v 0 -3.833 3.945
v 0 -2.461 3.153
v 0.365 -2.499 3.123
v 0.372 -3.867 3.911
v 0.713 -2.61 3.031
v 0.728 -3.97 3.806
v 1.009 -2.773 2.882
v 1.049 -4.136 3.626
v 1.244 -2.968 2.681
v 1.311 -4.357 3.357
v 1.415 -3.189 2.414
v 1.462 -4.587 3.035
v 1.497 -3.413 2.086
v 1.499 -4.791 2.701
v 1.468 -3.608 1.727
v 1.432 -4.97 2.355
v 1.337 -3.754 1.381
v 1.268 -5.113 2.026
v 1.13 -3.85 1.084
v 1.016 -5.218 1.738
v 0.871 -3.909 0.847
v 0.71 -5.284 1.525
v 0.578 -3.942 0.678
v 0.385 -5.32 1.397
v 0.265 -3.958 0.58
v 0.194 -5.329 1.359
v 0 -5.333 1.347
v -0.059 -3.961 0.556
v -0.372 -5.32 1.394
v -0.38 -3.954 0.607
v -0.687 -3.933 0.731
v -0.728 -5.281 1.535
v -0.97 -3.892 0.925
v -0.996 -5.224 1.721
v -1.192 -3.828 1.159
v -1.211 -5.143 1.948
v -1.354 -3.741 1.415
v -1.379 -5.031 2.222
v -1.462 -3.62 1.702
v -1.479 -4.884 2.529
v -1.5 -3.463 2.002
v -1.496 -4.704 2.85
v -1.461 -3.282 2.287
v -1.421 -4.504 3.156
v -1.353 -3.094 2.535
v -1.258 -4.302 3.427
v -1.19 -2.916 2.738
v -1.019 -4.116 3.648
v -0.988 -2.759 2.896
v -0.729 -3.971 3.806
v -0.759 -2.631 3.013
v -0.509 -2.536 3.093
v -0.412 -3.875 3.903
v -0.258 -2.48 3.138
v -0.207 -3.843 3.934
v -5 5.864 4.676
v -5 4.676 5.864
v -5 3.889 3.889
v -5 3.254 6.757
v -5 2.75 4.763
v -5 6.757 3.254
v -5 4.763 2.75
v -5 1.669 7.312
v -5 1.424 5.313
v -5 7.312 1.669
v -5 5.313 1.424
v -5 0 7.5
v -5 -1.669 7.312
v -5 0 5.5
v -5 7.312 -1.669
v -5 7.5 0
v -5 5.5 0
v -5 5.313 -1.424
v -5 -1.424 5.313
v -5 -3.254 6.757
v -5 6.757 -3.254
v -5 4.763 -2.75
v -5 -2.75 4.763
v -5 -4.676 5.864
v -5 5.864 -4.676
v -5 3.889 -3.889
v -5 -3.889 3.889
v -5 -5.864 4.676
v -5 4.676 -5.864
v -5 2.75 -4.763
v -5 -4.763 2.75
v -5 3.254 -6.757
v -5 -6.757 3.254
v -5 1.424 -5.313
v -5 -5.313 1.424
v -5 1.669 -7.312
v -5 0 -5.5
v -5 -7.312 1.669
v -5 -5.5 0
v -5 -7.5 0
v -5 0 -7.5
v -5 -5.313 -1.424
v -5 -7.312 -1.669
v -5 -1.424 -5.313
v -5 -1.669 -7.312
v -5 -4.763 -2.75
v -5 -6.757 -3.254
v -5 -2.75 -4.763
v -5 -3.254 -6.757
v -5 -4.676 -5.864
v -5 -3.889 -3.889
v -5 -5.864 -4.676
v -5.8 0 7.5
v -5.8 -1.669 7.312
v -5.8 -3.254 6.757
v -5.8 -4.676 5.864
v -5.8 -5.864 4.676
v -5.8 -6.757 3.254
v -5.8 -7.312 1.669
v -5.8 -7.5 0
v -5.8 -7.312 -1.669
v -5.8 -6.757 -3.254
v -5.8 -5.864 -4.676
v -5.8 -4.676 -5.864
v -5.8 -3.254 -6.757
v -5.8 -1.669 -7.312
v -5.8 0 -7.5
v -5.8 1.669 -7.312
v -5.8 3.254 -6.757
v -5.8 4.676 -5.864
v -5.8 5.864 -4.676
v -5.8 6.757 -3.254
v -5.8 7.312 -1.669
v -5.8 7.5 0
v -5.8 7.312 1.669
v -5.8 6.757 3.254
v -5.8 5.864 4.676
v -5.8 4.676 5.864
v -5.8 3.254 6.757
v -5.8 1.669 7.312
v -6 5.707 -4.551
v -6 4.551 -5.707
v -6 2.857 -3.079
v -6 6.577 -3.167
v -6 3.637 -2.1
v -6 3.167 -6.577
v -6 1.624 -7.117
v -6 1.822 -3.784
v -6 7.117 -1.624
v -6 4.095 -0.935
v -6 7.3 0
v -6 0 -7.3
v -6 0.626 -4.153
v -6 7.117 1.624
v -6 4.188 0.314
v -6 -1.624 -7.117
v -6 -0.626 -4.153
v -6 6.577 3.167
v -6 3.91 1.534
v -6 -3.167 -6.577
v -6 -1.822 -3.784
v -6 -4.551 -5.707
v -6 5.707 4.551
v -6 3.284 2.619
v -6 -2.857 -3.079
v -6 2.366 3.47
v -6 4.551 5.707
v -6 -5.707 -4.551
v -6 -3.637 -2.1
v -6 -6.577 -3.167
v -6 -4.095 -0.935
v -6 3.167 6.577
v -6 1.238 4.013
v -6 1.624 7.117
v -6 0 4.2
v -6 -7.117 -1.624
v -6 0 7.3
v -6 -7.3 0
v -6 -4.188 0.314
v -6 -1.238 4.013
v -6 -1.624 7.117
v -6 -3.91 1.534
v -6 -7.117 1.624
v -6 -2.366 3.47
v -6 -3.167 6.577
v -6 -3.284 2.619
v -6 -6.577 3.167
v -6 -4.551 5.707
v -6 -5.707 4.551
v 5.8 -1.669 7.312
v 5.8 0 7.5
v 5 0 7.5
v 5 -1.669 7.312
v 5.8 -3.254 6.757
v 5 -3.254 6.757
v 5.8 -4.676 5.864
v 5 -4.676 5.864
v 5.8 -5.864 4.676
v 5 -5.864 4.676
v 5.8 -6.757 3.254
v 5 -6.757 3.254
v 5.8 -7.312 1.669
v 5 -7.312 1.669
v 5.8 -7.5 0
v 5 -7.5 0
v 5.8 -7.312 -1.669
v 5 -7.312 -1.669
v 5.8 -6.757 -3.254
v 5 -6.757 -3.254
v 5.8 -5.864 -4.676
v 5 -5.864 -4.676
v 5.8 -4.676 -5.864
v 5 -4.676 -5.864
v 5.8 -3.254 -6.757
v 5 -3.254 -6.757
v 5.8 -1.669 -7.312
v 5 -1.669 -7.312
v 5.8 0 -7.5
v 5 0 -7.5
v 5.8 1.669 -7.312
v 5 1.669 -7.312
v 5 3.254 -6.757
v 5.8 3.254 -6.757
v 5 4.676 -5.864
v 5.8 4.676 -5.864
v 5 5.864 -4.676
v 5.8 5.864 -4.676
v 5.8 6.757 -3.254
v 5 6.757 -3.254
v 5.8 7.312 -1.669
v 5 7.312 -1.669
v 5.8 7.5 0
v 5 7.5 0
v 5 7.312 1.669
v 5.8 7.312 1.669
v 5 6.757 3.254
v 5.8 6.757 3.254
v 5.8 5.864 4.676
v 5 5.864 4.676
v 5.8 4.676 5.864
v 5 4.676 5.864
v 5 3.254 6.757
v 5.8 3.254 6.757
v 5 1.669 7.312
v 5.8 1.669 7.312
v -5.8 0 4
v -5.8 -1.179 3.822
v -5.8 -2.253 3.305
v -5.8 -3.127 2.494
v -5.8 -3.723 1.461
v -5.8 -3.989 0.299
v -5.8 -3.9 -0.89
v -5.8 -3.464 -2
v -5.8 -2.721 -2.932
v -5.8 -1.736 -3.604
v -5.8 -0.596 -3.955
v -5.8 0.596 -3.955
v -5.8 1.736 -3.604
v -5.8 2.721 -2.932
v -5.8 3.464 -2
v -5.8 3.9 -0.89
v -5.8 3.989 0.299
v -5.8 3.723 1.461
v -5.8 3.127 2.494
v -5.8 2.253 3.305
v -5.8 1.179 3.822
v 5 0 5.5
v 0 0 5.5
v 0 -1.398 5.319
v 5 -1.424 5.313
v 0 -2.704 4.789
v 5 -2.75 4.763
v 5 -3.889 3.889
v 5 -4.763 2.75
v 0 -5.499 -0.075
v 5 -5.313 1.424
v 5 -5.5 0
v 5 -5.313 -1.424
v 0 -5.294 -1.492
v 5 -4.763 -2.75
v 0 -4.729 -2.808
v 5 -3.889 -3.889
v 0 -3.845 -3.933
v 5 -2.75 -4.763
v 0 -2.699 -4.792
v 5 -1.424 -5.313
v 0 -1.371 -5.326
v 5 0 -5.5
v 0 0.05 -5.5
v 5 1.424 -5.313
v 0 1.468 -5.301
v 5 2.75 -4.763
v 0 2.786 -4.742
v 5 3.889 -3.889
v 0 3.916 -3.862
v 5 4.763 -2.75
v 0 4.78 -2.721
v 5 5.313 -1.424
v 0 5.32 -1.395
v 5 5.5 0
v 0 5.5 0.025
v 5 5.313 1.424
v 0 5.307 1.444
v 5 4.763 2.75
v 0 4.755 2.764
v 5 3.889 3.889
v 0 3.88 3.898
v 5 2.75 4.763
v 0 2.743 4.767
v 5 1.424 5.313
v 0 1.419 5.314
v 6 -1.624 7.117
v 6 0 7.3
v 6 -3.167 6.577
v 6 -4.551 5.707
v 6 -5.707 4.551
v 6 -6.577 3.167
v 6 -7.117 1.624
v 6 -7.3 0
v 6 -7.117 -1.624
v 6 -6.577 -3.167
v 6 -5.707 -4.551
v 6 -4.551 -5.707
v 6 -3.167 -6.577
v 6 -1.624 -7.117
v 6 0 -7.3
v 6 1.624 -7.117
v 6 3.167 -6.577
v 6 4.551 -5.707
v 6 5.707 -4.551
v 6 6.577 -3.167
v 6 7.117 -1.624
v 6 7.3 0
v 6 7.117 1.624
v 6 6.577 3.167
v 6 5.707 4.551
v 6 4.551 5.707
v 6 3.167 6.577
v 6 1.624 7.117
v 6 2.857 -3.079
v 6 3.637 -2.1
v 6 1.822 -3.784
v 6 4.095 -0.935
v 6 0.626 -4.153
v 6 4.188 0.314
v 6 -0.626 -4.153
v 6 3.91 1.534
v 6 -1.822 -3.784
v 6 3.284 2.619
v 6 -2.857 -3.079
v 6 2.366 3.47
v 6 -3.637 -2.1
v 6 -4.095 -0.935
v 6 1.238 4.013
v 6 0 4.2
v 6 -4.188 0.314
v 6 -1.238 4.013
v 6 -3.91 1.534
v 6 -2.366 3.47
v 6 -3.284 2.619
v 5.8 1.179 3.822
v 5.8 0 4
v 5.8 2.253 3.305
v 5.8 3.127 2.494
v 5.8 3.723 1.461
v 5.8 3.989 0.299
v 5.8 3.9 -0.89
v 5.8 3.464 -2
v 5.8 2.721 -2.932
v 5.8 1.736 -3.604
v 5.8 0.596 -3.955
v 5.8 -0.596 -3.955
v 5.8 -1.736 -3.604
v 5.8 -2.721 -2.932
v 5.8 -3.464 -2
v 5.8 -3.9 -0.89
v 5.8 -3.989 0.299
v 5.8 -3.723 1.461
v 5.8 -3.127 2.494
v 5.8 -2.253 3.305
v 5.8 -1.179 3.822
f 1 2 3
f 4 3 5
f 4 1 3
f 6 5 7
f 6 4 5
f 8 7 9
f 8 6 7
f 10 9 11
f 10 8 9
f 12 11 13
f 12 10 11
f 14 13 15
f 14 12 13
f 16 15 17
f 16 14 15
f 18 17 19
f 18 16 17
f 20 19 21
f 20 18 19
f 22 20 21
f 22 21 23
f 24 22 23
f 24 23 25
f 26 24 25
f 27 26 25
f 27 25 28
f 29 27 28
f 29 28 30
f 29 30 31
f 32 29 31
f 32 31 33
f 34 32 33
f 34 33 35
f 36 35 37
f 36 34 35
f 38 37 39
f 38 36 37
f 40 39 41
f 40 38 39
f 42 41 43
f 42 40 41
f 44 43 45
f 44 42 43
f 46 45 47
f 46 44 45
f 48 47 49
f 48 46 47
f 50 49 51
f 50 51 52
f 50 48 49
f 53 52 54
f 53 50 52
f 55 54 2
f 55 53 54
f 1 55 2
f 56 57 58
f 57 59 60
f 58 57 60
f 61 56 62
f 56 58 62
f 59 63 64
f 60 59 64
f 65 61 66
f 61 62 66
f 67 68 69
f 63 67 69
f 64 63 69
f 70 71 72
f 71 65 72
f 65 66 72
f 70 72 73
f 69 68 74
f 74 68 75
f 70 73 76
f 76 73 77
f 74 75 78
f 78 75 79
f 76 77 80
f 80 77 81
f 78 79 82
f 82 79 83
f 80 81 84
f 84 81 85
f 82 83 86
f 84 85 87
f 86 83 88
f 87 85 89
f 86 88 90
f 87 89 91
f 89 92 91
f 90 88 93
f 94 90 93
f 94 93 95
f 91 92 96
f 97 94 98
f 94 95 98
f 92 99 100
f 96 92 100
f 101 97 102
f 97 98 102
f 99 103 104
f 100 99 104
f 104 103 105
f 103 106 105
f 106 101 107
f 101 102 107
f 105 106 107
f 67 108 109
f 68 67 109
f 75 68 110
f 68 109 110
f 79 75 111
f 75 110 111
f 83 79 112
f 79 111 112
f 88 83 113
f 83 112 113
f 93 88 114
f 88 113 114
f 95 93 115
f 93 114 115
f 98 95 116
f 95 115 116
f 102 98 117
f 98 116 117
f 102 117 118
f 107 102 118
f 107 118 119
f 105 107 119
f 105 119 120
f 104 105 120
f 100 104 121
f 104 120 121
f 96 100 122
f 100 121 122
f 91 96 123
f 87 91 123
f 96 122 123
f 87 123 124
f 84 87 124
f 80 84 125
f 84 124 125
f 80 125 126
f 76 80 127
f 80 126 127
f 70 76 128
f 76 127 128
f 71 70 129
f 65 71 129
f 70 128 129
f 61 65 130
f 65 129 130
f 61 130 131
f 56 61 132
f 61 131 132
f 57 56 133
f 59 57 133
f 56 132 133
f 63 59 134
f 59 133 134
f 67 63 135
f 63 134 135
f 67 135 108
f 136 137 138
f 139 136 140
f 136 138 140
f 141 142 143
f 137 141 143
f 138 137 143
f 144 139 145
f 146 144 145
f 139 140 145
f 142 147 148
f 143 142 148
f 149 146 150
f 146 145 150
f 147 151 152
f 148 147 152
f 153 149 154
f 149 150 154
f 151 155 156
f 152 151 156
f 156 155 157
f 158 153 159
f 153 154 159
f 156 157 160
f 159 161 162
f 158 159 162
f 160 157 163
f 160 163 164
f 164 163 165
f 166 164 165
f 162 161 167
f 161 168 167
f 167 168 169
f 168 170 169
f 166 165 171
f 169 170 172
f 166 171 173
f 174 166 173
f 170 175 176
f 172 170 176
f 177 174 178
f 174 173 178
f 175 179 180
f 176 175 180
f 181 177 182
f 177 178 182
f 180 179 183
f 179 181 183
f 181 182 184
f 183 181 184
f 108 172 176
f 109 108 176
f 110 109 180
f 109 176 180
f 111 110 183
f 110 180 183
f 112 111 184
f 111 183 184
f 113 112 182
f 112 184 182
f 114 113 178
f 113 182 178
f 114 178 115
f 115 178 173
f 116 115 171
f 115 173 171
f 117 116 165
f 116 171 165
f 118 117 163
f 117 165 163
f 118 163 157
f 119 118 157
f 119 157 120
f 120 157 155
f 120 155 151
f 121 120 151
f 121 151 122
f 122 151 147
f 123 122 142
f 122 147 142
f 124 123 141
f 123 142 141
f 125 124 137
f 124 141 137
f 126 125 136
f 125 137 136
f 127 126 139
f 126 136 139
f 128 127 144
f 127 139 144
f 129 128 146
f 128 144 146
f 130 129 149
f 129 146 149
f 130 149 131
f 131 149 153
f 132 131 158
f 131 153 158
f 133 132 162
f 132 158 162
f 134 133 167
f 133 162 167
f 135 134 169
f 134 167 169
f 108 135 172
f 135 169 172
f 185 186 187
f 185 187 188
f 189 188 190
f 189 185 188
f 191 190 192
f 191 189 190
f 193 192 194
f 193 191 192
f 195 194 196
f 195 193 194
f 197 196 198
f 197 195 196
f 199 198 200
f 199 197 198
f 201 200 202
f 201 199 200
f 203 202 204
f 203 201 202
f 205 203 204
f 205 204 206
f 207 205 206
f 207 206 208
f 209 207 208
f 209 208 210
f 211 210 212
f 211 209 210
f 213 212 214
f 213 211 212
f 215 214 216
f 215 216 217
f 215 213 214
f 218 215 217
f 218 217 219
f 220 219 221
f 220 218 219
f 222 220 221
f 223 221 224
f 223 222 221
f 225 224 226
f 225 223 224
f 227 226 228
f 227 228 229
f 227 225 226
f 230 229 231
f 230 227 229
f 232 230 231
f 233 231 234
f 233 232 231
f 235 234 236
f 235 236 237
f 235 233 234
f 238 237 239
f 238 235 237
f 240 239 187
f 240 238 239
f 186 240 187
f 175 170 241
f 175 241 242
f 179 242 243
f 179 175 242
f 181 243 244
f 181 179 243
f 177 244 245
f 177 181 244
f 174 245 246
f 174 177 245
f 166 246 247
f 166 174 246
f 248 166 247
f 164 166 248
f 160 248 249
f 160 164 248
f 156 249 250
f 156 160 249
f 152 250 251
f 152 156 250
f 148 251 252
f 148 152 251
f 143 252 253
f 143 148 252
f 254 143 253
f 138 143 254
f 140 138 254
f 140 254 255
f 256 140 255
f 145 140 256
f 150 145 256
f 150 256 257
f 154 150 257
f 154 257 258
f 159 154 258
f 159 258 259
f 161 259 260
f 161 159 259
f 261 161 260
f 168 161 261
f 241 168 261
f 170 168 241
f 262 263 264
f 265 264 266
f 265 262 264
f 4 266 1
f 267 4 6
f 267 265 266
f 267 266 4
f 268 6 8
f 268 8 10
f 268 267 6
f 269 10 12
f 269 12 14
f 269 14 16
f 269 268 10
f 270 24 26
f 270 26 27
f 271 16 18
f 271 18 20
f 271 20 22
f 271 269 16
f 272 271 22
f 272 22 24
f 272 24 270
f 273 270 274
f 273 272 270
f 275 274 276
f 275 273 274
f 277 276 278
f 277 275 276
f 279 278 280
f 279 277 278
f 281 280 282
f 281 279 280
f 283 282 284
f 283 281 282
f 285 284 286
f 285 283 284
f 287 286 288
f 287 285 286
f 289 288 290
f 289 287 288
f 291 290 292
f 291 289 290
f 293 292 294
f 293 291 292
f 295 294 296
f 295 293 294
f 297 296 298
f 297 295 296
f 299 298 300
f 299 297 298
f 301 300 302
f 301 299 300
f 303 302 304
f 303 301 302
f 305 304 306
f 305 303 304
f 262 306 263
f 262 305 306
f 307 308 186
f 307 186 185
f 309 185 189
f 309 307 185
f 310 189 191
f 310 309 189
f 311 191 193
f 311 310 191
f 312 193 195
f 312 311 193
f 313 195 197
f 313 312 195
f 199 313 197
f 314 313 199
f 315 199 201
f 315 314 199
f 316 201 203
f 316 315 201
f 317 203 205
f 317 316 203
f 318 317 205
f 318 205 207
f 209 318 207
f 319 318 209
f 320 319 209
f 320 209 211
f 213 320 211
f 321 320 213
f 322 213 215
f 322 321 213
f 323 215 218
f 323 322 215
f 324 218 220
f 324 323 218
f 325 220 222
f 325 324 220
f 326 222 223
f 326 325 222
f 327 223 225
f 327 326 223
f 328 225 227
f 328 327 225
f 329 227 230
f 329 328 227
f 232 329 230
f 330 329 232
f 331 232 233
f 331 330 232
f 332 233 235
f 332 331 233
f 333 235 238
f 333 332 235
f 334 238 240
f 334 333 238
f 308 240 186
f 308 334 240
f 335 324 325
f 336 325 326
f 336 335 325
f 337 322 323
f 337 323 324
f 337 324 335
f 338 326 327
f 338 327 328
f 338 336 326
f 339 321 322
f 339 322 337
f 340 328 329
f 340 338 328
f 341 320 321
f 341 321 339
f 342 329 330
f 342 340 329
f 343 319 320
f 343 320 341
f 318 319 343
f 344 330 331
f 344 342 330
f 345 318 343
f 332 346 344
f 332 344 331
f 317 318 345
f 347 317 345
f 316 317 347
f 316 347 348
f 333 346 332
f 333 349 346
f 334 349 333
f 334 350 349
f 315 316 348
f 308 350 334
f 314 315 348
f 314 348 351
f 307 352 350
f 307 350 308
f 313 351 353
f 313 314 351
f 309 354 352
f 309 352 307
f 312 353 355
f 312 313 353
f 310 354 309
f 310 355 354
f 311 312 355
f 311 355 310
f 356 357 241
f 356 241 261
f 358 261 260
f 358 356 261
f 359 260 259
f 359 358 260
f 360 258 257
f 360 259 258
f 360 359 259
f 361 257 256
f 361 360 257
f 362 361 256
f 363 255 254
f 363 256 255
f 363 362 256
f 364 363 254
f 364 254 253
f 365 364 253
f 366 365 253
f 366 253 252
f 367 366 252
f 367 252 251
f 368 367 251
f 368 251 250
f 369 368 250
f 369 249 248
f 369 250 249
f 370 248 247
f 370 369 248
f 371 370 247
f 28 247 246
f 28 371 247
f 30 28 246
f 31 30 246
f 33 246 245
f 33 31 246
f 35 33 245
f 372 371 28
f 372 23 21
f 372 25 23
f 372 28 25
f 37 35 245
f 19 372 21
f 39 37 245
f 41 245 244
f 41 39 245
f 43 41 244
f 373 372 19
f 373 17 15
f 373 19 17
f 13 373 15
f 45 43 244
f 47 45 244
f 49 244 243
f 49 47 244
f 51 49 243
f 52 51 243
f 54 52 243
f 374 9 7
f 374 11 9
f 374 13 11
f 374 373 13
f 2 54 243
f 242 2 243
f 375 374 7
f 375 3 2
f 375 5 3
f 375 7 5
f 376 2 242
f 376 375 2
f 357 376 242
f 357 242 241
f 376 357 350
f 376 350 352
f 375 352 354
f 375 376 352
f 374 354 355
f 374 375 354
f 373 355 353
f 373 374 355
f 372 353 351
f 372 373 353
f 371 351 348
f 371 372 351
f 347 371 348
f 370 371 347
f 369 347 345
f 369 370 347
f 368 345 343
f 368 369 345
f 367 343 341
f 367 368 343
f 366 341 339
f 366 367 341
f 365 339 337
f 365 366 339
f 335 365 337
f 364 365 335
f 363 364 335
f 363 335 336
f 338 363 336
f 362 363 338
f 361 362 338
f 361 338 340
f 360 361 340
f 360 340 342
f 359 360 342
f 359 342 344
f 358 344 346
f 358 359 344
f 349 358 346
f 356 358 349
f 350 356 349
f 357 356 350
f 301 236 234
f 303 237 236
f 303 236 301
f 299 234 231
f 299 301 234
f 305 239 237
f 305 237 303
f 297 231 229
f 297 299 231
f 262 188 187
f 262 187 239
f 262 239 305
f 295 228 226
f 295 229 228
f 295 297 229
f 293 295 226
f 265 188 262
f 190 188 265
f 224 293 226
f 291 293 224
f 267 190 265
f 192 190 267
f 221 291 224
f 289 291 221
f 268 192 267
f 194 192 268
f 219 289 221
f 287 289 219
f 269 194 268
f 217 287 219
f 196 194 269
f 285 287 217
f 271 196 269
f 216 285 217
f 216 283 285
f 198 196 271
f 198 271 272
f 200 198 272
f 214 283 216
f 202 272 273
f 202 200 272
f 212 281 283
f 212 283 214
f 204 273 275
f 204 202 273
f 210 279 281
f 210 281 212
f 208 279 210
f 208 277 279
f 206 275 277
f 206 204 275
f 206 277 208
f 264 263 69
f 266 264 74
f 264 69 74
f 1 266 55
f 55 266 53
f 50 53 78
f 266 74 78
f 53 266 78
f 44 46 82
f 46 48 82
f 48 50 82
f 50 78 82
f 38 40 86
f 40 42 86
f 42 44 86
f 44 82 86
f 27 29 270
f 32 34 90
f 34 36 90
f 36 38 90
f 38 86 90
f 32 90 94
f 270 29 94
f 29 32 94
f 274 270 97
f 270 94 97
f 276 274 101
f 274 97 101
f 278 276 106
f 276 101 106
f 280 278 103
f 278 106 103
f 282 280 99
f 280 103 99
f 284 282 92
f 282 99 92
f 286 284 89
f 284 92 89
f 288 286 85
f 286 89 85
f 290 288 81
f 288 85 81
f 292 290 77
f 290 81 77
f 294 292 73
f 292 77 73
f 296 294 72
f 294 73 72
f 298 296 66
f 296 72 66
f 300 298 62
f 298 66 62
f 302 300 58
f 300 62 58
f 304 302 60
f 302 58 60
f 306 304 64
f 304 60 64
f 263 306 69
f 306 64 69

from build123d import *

# Parameters (mm, degrees)
CUT_EXTRUDE1_DEPTH      = 17.015617378
CUT_EXTRUDE1_DEPTH_BACK = 17.015617378
SKETCH2_R               = 4
CHAMFER1_SIZE           = 0.2
CUT_EXTRUDE2_DEPTH      = 5
CUT_EXTRUDE2_DEPTH_BACK = 5
SKETCH4_R               = 1.5


with BuildPart() as part:
    # Sketch1 → Revolve1 (revolve)
    with BuildSketch(Plane.XY):
        Polygon((0, 5.5), (-5, 5.5), (-5, 7.5), (-6, 7.5), (-6, 0), (0, 0), align=None)
    revolve1 = revolve(axis=Axis((-6, 0, 0), (1, 0, 0)))

    # Mirror1: Revolve1 across plane
    add(revolve1.mirror(Plane(origin=(0, 0, 0), x_dir=(0, 0, 1), z_dir=(1, 0, 0))))

    # Sketch2 → Cut-Extrude1 (cut, two sides: drawn at the far end of the back side and taken through both)
    with BuildSketch(Plane.ZY.offset(6).offset(-CUT_EXTRUDE1_DEPTH_BACK)):
        Circle(SKETCH2_R)
    extrude(amount=CUT_EXTRUDE1_DEPTH + CUT_EXTRUDE1_DEPTH_BACK, mode=Mode.SUBTRACT)

    # Chamfer1
    chamfer1_edges = [part.edges().sort_by_distance(p)[0] for p in [
        (6, 0, -4),
        (-6, 0, -4),
        (6, -7.5, 0),
        (-6, -7.5, 0),
    ]]
    chamfer(chamfer1_edges, length=CHAMFER1_SIZE)

    # Sketch4 → Cut-Extrude2 (cut, two sides: drawn at the far end of the back side and taken through both)
    with BuildSketch(Plane(origin=(0, -3.464101615, 2), x_dir=(-1, 0, 0), z_dir=(0, 0.866025403784438, -0.500000000000001)).offset(-CUT_EXTRUDE2_DEPTH_BACK)):
        Circle(SKETCH4_R)
    extrude(amount=CUT_EXTRUDE2_DEPTH + CUT_EXTRUDE2_DEPTH_BACK, mode=Mode.SUBTRACT)


solid = part.part
